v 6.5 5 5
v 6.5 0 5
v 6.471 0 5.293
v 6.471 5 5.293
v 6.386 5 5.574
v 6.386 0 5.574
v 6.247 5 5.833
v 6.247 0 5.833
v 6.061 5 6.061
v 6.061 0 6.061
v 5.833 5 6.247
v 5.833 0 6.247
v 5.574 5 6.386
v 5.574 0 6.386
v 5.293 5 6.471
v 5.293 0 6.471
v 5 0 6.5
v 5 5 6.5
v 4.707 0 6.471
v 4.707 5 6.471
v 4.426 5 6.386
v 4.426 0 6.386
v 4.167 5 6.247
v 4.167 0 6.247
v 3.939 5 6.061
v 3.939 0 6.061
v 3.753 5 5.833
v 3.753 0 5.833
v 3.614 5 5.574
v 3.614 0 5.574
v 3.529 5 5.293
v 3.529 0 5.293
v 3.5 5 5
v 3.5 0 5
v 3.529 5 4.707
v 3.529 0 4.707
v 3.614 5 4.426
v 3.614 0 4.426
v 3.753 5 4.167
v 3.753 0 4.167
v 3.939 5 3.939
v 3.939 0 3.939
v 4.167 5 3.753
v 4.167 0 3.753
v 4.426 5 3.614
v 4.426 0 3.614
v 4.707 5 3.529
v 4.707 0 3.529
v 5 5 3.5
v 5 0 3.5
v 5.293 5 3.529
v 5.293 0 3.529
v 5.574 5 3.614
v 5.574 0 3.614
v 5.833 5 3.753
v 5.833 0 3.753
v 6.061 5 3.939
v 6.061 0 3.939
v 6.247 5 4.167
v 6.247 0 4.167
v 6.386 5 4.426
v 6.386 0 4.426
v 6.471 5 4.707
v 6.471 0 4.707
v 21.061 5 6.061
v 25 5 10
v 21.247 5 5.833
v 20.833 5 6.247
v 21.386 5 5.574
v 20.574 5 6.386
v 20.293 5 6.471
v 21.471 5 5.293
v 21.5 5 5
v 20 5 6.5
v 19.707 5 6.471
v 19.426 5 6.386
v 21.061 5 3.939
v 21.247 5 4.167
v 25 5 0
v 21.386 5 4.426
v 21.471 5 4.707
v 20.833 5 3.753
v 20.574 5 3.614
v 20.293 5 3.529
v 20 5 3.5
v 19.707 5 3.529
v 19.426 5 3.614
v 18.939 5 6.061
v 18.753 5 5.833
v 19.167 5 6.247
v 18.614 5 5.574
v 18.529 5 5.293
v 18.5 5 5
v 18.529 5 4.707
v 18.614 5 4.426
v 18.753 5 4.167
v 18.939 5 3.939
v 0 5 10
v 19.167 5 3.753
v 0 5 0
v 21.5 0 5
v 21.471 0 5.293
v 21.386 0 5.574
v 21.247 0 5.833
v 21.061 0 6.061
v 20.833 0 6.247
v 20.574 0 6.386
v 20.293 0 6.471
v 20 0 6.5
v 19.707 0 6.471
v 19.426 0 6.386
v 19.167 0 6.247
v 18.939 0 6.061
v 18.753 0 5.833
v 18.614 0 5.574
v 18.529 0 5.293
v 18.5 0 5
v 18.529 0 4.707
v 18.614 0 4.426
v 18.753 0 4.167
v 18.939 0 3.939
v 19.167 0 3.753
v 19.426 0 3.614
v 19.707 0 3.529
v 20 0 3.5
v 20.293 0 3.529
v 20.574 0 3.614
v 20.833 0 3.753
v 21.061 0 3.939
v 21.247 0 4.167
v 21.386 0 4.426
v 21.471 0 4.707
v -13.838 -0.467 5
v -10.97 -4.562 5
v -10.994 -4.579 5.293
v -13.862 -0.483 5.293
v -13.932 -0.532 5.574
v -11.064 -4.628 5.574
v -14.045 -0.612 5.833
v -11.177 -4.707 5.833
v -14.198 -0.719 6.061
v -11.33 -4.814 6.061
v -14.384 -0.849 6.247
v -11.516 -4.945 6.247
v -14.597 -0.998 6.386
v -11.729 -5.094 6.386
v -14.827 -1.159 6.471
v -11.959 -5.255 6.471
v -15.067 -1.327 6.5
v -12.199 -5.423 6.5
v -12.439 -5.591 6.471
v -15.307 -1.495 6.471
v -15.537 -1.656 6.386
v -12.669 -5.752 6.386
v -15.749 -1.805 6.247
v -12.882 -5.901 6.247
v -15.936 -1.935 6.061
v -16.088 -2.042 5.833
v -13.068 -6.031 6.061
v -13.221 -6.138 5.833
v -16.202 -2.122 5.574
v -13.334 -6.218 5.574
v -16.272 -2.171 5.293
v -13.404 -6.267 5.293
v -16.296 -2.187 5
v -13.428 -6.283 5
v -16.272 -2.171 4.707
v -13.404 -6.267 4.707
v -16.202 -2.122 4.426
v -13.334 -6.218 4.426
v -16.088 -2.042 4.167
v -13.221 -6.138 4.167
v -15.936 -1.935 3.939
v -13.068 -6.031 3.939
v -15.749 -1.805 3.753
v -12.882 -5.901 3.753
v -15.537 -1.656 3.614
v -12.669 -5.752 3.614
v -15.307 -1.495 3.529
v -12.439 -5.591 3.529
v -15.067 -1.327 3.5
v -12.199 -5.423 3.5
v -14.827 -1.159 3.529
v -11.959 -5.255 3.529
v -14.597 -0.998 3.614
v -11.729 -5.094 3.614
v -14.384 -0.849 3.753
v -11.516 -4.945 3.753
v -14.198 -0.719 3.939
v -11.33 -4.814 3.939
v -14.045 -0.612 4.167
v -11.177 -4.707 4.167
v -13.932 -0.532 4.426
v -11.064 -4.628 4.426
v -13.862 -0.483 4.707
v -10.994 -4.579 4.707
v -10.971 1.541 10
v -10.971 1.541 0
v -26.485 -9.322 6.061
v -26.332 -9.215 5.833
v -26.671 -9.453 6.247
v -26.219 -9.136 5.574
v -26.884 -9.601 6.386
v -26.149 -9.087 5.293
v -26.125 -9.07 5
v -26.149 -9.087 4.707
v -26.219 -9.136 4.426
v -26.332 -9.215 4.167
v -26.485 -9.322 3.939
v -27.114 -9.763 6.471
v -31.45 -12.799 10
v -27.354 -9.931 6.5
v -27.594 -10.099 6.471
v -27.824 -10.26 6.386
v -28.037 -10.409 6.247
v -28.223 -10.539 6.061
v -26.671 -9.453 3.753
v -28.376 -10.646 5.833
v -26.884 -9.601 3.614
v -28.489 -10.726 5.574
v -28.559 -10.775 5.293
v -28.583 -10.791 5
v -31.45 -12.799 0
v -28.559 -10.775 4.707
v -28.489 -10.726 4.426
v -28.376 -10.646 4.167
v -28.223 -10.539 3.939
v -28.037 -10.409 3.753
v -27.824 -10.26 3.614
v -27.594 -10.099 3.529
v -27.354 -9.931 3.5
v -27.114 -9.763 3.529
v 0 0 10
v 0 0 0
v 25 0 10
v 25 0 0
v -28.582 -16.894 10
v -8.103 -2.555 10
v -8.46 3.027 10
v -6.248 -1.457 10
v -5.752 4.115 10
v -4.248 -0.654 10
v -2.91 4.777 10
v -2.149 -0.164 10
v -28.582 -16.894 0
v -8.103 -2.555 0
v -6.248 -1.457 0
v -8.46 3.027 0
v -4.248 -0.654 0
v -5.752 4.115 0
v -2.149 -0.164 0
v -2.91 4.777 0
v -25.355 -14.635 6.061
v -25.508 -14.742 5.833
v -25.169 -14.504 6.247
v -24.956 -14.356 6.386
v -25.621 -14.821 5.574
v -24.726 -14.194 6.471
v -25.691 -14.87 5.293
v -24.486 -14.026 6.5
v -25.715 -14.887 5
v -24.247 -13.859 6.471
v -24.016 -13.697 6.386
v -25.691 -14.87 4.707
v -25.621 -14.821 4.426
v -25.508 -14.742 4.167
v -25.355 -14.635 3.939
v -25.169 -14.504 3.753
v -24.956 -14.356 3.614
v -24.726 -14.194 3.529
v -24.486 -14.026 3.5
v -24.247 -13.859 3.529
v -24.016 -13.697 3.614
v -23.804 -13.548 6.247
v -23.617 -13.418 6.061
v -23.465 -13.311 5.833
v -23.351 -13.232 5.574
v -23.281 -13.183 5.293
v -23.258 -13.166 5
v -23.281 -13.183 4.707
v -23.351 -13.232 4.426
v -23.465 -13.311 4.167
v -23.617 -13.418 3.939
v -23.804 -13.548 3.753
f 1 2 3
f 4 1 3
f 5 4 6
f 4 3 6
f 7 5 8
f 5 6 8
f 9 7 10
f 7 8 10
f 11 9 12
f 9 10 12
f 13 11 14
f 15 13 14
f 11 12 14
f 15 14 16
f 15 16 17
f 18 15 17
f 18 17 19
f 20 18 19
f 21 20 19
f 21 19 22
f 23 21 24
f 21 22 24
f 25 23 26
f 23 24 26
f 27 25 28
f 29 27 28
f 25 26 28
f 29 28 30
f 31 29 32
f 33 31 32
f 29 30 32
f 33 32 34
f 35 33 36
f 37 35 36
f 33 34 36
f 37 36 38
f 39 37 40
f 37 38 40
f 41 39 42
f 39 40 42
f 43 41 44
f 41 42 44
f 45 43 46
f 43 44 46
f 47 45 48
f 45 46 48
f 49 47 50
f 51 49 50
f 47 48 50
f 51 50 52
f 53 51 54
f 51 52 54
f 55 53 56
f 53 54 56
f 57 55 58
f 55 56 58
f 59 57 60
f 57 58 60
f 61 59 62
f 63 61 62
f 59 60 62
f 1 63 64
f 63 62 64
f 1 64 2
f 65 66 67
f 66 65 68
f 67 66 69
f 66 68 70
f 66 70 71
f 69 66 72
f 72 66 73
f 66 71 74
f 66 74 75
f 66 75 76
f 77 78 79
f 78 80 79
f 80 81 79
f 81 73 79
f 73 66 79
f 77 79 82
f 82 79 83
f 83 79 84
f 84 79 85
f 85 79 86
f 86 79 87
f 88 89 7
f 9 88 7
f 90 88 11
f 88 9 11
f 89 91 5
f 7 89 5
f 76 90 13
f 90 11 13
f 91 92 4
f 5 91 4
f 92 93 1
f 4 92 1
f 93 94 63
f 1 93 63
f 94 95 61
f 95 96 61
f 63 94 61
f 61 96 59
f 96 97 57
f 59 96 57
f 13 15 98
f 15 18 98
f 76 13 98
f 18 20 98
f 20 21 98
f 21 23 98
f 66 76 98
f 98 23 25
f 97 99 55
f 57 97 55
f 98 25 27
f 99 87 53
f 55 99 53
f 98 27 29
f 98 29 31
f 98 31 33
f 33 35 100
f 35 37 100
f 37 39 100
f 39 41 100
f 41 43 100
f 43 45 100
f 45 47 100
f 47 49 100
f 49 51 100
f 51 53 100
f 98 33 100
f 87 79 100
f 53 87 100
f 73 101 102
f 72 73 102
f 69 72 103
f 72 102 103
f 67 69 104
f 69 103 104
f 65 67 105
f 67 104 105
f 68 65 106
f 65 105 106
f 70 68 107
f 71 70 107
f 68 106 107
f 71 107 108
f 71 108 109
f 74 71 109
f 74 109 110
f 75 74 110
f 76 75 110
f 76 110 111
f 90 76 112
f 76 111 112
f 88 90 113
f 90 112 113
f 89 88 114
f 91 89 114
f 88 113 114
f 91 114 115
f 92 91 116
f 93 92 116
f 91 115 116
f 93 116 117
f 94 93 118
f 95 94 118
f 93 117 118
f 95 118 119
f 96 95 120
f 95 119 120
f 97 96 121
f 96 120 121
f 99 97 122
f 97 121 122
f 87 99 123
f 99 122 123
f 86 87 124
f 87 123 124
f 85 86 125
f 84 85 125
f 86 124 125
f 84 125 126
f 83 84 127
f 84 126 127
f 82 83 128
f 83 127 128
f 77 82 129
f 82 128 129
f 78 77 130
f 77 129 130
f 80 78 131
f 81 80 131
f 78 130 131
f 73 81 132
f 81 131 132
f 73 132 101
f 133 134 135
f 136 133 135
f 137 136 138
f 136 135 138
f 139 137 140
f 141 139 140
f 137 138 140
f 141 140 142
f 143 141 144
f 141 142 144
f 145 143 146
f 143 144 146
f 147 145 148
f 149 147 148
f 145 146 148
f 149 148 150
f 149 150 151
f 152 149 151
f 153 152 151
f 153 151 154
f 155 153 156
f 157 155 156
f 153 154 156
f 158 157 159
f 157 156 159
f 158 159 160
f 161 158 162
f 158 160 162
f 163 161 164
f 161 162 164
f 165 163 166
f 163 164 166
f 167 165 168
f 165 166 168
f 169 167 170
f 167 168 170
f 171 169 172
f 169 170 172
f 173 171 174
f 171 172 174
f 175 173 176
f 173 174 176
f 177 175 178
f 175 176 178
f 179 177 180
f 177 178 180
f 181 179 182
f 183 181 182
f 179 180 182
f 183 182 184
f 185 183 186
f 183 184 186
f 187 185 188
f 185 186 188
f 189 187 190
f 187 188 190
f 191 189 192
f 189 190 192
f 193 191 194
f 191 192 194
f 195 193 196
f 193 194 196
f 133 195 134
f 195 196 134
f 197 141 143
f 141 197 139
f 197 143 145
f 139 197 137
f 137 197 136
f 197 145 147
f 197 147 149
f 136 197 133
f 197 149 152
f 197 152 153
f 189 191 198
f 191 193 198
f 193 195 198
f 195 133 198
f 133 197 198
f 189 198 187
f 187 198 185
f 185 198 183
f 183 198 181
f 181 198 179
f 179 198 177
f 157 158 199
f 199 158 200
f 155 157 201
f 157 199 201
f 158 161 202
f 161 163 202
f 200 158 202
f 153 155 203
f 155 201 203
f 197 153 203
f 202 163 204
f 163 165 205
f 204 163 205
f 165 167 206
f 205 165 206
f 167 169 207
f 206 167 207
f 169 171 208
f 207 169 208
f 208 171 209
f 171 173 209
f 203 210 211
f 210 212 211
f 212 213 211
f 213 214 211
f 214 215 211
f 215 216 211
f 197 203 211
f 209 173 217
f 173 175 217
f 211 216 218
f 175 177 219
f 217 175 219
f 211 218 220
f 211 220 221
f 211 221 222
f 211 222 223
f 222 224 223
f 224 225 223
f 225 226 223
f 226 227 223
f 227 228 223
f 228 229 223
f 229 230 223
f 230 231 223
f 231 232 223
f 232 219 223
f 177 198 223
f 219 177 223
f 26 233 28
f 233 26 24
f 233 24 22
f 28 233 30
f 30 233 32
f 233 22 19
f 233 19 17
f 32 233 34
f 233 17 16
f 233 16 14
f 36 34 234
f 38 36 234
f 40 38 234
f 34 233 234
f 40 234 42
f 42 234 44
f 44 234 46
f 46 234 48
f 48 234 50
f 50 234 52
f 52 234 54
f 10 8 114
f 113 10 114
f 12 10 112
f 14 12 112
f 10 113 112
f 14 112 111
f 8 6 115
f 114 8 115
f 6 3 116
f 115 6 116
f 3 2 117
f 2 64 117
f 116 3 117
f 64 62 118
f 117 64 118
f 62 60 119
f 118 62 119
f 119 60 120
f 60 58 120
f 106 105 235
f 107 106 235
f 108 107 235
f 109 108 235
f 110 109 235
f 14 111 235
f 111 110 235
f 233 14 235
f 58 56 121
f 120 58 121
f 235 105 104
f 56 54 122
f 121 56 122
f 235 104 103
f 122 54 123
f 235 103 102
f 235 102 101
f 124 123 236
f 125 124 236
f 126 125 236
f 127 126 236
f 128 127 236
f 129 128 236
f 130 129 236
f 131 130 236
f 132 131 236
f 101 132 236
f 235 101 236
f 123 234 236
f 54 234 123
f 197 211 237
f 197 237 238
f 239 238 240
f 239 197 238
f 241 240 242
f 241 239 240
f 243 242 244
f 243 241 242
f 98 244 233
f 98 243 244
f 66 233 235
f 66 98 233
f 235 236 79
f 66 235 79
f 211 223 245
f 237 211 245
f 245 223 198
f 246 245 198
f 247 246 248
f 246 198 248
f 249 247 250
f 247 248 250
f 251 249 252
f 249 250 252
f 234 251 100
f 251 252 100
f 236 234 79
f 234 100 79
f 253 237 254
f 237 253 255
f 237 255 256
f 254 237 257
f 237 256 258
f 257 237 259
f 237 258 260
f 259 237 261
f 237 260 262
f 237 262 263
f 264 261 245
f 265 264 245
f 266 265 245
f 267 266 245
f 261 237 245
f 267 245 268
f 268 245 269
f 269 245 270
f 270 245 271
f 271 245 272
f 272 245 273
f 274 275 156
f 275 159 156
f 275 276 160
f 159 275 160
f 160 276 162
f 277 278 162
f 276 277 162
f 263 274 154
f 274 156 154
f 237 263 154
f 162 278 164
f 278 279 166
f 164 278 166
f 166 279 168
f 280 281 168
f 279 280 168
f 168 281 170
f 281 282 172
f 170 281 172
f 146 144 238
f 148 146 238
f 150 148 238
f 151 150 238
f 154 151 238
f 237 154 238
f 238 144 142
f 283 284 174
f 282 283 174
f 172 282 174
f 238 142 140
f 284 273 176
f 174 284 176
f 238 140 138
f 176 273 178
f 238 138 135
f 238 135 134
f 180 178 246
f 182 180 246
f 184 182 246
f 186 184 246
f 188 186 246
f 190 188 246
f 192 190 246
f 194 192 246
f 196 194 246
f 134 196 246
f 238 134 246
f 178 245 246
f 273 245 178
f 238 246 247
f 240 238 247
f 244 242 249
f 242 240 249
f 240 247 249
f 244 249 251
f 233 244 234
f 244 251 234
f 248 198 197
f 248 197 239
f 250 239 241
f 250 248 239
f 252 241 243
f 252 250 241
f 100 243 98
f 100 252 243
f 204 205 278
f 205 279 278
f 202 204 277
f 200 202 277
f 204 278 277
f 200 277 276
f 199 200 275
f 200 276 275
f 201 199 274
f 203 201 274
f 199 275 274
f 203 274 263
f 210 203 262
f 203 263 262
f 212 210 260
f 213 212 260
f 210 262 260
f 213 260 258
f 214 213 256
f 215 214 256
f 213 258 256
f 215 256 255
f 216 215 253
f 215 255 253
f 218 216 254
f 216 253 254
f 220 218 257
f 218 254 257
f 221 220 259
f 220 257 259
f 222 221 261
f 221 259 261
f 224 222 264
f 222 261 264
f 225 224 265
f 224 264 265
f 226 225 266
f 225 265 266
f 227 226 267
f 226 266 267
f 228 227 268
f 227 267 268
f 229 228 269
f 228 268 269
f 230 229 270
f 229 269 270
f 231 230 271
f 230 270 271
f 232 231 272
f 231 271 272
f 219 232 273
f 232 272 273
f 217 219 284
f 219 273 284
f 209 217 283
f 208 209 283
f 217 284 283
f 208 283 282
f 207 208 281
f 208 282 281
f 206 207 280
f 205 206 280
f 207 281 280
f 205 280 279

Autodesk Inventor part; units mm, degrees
ref_plane "YZ Plane" through (0, 0, 0) normal (1, 0, 0) x (0, 1, 0)
ref_plane "XZ Plane" through (0, 0, 0) normal (0, 1, 0) x (-1, 0, 0)
ref_plane "XY Plane" through (0, 0, 0) normal (0, 0, 1) x (1, 0, 0)
sketch "スケッチ1" plane through (0, 0, 0) normal (0, 0, 1) x (1, 0, 0)
  line L0 (0, 0) -> (25, 0)
  line L1 (25, 0) -> (25, 5)
  line L2 (25, 5) -> (0, 5)
  line L3 (0, 5) -> (0, 0)
  circle A0 centre (5, 2.5) radius 1.5 construction
  circle A1 centre (20, 2.5) radius 1.5 construction
  line L4 (20, 2.5) -> (5, 2.5) construction
  line L5 (-10.9711, 1.5408) -> (-31.4499, -12.7986)
  line L6 (-31.4499, -12.7986) -> (-28.582, -16.8943)
  line L7 (-28.582, -16.8943) -> (-8.1032, -2.5549)
  line L8 (-8.1032, -2.5549) -> (-10.9711, 1.5408)
  line L9 (-30.016, -14.8465) -> (-9.5372, -0.5071) construction
  arc A2 (0, 2.5) -> (-9.5372, -0.5071) centre (0, -14.1275) ccw construction
  arc A3 (0, 5) -> (-10.9711, 1.5408) centre (0, -14.1275) ccw
  arc A4 (0, 0) -> (-8.1032, -2.5549) centre (0, -14.1275) ccw
  circle A5 centre (-25.9202, -11.9786) radius 1.5 construction
  circle A6 centre (-13.6329, -3.3749) radius 1.5 construction
  point P0 (25, 2.5)
  point P1 (-8.1032, -2.5549)
  point P2 (-10.9711, 1.5408)
  dimension "d0" = 5
  dimension "d1" = 3
  dimension "d2" = 3
  dimension "d3" = 15
  dimension "d4" = 5
  dimension "d5" = 5
  dimension "d6" = 5
  dimension "d7" = 25
  dimension "d8" = 2.5
  dimension "d9" = 2.5
  dimension "d10" = 145
  dimension "d11" = 10
  dimension "d12" = 3
  dimension "d13" = 3
  dimension "d14" = 5
  dimension "d15" = 5
extrude "押し出し1" add sketch "スケッチ1" along normal blind 10
sketch "スケッチ2" plane through (0, 0, 0) normal (0, -1, 0) x (1, 0, 0)
  line L0 (25, 0) -> (25, 10) projected
  circle A0 centre (5, 5) radius 1.5
  circle A1 centre (20, 5) radius 1.5
  point P0 (0, 0)
  point P1 (25, 5)
  dimension "d18" = 3
  dimension "d19" = 3
  dimension "d20" = 15
  dimension "d21" = 5
extrude "押し出し2" cut sketch "スケッチ2" against normal through all
sketch "スケッチ3" plane through (-8.1032, -2.5549, 0) normal (0.5736, -0.8192, 0) x (0.8192, 0.5736, 0)
  line L0 (-25, 0) -> (-25, 10) projected
  circle A0 centre (-20, 5) radius 1.5
  circle A1 centre (-5, 5) radius 1.5
  point P0 (8.1032, 0)
  point P1 (-25, 5)
  dimension "d24" = 3
  dimension "d25" = 3
  dimension "d26" = 15
  dimension "d27" = 5
extrude "押し出し3" cut sketch "スケッチ3" against normal through all
properties part number "カウンター1.2.1" material "アルミニウム 6061"
